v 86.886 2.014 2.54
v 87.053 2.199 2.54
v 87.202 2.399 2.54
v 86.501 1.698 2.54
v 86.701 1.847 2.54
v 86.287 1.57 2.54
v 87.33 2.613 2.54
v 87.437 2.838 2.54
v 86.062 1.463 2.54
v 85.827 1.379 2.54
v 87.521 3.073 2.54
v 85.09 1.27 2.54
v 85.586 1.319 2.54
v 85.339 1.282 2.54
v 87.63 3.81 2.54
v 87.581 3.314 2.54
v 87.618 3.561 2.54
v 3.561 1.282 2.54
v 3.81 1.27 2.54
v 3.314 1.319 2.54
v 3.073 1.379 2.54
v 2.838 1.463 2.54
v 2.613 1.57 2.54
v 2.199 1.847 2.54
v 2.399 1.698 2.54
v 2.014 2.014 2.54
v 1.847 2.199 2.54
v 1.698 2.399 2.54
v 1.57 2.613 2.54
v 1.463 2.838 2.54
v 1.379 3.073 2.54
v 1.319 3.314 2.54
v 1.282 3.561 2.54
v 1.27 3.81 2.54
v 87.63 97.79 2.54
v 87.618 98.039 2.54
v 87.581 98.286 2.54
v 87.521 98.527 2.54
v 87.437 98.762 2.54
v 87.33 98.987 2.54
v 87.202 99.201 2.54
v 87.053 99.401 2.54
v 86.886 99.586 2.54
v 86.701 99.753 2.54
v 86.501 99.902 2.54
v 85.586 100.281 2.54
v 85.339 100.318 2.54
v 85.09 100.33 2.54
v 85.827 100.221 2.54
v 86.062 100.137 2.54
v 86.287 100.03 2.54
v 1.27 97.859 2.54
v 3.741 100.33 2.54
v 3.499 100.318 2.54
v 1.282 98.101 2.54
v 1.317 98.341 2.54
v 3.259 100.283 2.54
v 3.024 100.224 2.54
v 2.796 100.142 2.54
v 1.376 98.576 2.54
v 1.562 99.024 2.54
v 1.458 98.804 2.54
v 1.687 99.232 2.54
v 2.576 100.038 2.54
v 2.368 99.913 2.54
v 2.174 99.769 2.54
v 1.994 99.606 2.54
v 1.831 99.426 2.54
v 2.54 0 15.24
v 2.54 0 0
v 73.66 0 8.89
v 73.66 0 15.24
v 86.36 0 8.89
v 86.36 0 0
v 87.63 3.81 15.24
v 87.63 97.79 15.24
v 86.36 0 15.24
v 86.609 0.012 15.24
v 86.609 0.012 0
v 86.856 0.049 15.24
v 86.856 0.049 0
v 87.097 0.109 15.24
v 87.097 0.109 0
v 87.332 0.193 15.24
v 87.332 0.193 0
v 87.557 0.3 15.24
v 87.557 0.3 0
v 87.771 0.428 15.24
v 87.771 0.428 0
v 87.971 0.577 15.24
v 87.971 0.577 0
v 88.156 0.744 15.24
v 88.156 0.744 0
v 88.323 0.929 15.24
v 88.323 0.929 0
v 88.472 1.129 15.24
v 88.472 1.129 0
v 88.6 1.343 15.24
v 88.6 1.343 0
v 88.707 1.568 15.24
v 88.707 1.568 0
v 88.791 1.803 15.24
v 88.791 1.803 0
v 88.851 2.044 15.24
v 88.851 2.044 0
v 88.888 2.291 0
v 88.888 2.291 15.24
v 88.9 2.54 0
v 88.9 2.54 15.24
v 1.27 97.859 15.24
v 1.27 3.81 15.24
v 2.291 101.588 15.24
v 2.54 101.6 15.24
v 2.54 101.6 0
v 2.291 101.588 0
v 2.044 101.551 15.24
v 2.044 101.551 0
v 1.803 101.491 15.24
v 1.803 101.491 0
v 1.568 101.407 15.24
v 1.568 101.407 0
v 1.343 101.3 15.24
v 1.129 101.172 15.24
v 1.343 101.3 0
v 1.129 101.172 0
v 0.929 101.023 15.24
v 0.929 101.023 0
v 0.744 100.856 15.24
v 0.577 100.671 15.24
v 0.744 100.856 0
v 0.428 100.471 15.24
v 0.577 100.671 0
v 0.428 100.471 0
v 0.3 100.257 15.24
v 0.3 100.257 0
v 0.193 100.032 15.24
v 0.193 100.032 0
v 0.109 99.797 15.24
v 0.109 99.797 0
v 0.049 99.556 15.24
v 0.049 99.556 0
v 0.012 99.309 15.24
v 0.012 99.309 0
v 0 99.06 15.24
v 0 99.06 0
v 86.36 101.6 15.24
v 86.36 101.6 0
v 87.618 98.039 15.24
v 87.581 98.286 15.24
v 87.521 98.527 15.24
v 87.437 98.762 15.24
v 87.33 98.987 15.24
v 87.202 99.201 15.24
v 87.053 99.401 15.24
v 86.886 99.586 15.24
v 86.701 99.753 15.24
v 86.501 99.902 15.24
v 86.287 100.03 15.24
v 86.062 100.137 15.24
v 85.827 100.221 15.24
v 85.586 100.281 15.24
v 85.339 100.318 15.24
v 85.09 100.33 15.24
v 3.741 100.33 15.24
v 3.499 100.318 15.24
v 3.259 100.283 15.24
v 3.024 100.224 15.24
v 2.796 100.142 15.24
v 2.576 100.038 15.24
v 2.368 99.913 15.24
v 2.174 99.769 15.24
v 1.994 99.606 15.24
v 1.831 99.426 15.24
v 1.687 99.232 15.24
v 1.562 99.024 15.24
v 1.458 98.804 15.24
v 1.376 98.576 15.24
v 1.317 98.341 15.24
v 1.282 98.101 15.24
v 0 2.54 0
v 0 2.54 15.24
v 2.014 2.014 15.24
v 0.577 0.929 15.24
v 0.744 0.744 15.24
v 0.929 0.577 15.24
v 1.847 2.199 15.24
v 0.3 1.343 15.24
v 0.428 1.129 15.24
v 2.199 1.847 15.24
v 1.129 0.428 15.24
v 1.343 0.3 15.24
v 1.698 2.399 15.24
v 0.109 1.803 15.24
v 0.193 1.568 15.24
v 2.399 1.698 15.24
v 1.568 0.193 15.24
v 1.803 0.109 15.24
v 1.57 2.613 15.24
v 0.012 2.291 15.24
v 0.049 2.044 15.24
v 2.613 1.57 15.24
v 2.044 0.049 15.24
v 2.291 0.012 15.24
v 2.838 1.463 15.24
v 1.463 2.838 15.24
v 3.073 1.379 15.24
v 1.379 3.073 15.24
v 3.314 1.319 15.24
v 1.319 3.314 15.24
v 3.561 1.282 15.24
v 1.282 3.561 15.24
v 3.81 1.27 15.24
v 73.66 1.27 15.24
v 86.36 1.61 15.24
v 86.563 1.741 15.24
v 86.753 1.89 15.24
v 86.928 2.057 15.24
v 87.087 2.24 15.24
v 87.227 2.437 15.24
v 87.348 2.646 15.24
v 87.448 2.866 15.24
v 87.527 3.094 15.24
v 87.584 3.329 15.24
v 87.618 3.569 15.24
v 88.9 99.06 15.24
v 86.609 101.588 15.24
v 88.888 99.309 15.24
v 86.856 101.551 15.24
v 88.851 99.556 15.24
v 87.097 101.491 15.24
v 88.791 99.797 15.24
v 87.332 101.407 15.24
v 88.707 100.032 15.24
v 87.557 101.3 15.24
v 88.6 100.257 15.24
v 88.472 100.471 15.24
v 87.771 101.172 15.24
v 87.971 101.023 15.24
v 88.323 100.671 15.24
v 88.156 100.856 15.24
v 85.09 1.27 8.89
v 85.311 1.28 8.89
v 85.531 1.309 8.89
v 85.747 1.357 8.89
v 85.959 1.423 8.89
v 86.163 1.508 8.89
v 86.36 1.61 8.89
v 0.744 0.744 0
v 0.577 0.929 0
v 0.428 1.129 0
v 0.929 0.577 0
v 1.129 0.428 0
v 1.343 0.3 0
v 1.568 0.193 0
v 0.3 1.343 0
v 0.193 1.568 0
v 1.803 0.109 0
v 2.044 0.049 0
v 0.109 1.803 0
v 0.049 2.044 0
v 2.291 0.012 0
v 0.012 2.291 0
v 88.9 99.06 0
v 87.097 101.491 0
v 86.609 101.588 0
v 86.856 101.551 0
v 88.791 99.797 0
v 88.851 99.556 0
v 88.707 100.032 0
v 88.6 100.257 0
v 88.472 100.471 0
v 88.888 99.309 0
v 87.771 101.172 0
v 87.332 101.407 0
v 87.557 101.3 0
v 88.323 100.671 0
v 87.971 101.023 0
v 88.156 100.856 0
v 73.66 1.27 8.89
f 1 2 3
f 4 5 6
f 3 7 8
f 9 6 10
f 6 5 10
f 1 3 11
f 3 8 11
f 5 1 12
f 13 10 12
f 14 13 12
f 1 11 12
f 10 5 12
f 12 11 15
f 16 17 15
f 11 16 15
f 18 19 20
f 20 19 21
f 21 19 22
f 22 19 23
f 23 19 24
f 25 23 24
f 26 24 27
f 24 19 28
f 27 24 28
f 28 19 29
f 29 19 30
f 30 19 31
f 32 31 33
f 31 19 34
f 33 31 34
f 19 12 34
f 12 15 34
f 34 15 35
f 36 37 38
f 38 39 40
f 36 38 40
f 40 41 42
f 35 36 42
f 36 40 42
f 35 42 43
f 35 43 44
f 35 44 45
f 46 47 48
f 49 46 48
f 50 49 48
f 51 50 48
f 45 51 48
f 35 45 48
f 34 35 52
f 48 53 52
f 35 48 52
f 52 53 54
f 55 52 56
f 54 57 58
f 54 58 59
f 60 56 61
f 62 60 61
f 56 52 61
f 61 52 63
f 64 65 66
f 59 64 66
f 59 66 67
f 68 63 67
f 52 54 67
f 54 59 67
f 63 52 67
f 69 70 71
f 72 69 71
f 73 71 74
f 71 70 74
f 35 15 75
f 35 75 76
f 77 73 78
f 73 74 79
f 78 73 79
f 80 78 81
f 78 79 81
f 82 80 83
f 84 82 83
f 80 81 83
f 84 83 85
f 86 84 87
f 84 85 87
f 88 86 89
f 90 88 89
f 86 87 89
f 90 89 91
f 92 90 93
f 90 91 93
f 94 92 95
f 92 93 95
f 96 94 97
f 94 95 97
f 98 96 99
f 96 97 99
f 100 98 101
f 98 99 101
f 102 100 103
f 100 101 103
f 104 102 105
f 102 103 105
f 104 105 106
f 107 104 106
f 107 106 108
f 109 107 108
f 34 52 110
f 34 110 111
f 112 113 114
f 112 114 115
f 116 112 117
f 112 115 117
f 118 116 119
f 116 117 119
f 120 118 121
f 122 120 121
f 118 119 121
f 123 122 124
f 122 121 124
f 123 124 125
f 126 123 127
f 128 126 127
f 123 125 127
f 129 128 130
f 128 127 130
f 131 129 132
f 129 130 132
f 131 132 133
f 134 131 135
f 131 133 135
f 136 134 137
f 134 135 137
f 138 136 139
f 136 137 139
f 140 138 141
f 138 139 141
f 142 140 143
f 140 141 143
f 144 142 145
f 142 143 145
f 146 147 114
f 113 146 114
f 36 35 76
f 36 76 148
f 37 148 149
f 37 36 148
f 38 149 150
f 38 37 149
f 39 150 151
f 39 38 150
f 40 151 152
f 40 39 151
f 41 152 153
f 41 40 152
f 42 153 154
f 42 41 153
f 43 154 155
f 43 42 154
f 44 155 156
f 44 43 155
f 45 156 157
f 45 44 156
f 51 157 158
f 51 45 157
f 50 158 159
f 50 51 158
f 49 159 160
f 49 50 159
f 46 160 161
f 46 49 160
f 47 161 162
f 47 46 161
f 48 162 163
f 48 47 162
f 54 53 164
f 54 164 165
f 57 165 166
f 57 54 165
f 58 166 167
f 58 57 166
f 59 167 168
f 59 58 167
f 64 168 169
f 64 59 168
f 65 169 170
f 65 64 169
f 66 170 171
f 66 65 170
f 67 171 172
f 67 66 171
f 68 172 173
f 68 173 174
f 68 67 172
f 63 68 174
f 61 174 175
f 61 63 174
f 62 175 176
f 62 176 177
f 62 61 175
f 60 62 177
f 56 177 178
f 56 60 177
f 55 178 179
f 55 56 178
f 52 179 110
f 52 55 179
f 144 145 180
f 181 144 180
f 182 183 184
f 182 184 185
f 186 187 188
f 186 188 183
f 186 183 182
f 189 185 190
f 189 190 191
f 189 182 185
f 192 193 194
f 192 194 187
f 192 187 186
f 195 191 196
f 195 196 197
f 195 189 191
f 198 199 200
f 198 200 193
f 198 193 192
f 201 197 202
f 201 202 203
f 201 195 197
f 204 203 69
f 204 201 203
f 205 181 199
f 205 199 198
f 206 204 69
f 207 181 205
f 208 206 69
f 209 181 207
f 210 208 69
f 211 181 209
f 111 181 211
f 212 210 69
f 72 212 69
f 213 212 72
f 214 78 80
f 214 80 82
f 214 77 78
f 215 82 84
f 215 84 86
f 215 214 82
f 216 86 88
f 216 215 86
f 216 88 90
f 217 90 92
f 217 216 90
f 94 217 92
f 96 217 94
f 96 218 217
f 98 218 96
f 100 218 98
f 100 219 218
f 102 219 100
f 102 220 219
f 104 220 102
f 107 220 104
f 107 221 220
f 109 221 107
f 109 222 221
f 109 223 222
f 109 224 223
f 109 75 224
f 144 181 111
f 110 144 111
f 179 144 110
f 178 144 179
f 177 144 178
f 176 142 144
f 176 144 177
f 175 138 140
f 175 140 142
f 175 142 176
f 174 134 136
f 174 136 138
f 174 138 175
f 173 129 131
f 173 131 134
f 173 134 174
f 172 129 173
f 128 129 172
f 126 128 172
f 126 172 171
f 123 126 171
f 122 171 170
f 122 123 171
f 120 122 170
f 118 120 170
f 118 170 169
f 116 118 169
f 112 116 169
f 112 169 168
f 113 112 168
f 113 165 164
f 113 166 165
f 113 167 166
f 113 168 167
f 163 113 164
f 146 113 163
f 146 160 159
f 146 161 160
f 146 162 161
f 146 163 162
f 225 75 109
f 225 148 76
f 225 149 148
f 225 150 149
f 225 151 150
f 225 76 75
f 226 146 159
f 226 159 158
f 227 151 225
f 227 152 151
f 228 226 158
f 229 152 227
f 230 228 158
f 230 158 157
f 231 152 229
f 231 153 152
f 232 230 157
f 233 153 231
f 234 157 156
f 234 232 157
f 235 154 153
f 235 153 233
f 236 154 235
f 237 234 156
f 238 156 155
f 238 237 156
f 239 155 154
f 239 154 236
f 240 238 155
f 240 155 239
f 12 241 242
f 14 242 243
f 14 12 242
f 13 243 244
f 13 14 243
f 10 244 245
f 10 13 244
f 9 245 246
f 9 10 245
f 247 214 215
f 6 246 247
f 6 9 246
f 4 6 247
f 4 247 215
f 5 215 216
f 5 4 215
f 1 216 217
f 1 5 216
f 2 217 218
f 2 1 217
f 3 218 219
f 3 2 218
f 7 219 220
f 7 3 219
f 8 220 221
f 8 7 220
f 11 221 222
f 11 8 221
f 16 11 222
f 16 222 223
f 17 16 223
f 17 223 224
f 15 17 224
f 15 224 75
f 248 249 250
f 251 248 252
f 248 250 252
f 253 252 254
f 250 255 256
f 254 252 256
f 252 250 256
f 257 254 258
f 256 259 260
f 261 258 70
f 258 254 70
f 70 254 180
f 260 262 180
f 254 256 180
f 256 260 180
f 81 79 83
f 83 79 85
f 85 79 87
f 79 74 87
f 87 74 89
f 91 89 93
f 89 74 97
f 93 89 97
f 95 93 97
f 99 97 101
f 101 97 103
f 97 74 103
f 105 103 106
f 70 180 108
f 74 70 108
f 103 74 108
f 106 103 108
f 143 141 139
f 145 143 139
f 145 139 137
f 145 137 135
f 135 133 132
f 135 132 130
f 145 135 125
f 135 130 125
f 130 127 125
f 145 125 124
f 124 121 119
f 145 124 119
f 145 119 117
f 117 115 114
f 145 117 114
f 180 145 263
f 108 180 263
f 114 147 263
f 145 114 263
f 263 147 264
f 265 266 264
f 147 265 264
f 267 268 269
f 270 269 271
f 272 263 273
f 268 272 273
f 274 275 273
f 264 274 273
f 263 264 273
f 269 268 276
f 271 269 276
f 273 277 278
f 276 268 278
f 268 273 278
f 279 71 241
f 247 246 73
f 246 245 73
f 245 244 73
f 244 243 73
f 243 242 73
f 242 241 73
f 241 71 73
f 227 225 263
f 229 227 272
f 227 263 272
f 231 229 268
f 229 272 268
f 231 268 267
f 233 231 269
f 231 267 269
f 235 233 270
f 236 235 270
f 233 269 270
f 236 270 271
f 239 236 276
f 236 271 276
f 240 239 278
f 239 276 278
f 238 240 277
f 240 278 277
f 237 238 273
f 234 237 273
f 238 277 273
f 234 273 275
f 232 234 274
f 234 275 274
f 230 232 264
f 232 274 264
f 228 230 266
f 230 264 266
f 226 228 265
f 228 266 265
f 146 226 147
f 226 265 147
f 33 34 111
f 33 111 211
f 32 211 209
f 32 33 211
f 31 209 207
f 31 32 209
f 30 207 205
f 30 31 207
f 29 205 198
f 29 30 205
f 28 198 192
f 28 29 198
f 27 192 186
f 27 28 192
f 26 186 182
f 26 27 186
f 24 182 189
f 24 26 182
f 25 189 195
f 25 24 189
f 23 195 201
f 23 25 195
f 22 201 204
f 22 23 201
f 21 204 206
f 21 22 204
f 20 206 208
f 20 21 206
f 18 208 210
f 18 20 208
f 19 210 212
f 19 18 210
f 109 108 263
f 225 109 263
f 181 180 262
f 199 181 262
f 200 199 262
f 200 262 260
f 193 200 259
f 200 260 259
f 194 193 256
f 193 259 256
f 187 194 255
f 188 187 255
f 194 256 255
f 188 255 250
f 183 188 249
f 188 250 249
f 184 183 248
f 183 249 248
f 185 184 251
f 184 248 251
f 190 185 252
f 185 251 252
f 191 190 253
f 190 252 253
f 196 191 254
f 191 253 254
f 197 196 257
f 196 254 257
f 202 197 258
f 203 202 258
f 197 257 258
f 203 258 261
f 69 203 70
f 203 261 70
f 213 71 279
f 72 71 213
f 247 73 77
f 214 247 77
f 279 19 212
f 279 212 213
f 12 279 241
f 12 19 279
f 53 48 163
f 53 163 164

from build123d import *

# Parameters (mm, degrees)
BOSS_EXTRUDE2_DEPTH = 2.54
BOSS_EXTRUDE3_DEPTH = 15.24
SKETCH6_W           = 12.7
SKETCH6_H           = 6.35
CUT_EXTRUDE3_DEPTH  = 2.54


with BuildPart() as part:
    # Sketch1 → Boss-Extrude2 (new body)
    with BuildSketch(Plane.XY):
        with BuildLine():
            ThreePointArc((1.27, 97.858615874), (1.993851652, 99.606148348), (3.741384126, 100.33))
            Line((3.741384126, 100.33), (85.09, 100.33))
            ThreePointArc((85.09, 100.33), (86.886051224, 99.586051224), (87.63, 97.79))
            Line((87.63, 97.79), (87.63, 3.81))
            ThreePointArc((87.63, 3.81), (86.886051224, 2.013948776), (85.09, 1.27))
            Line((85.09, 1.27), (3.81, 1.27))
            ThreePointArc((3.81, 1.27), (2.013948776, 2.013948776), (1.27, 3.81))
            Line((1.27, 3.81), (1.27, 97.858615874))
        make_face()
    extrude(amount=BOSS_EXTRUDE2_DEPTH)

    # Sketch1<3> → Boss-Extrude3 (add)
    with BuildSketch(Plane.XY):
        with BuildLine():
            Line((0, 99.06), (0, 2.54))
            ThreePointArc((0, 2.54), (0.743948776, 0.743948776), (2.54, 0))
            Line((2.54, 0), (86.36, 0))
            ThreePointArc((86.36, 0), (88.156051224, 0.743948776), (88.9, 2.54))
            Line((88.9, 2.54), (88.9, 99.06))
            ThreePointArc((88.9, 99.06), (88.156051224, 100.856051224), (86.36, 101.6))
            Line((86.36, 101.6), (2.54, 101.6))
            ThreePointArc((2.54, 101.6), (0.743948776, 100.856051224), (0, 99.06))
        make_face()
        with BuildLine():
            Line((1.27, 97.858615874), (1.27, 3.81))
            ThreePointArc((1.27, 3.81), (2.013948776, 2.013948776), (3.81, 1.27))
            Line((3.81, 1.27), (85.09, 1.27))
            ThreePointArc((85.09, 1.27), (86.886051224, 2.013948776), (87.63, 3.81))
            Line((87.63, 3.81), (87.63, 97.79))
            ThreePointArc((87.63, 97.79), (86.886051224, 99.586051224), (85.09, 100.33))
            Line((85.09, 100.33), (3.741384126, 100.33))
            ThreePointArc((3.741384126, 100.33), (1.993851652, 99.606148348), (1.27, 97.858615874))
        make_face(mode=Mode.SUBTRACT)
    extrude(amount=BOSS_EXTRUDE3_DEPTH)

    # Sketch6 → Cut-Extrude3 (cut)
    with BuildSketch(Plane.XZ):
        with Locations((80.01, 12.065)):
            Rectangle(SKETCH6_W, SKETCH6_H)
    extrude(amount=-CUT_EXTRUDE3_DEPTH, mode=Mode.SUBTRACT)


solid = part.part
